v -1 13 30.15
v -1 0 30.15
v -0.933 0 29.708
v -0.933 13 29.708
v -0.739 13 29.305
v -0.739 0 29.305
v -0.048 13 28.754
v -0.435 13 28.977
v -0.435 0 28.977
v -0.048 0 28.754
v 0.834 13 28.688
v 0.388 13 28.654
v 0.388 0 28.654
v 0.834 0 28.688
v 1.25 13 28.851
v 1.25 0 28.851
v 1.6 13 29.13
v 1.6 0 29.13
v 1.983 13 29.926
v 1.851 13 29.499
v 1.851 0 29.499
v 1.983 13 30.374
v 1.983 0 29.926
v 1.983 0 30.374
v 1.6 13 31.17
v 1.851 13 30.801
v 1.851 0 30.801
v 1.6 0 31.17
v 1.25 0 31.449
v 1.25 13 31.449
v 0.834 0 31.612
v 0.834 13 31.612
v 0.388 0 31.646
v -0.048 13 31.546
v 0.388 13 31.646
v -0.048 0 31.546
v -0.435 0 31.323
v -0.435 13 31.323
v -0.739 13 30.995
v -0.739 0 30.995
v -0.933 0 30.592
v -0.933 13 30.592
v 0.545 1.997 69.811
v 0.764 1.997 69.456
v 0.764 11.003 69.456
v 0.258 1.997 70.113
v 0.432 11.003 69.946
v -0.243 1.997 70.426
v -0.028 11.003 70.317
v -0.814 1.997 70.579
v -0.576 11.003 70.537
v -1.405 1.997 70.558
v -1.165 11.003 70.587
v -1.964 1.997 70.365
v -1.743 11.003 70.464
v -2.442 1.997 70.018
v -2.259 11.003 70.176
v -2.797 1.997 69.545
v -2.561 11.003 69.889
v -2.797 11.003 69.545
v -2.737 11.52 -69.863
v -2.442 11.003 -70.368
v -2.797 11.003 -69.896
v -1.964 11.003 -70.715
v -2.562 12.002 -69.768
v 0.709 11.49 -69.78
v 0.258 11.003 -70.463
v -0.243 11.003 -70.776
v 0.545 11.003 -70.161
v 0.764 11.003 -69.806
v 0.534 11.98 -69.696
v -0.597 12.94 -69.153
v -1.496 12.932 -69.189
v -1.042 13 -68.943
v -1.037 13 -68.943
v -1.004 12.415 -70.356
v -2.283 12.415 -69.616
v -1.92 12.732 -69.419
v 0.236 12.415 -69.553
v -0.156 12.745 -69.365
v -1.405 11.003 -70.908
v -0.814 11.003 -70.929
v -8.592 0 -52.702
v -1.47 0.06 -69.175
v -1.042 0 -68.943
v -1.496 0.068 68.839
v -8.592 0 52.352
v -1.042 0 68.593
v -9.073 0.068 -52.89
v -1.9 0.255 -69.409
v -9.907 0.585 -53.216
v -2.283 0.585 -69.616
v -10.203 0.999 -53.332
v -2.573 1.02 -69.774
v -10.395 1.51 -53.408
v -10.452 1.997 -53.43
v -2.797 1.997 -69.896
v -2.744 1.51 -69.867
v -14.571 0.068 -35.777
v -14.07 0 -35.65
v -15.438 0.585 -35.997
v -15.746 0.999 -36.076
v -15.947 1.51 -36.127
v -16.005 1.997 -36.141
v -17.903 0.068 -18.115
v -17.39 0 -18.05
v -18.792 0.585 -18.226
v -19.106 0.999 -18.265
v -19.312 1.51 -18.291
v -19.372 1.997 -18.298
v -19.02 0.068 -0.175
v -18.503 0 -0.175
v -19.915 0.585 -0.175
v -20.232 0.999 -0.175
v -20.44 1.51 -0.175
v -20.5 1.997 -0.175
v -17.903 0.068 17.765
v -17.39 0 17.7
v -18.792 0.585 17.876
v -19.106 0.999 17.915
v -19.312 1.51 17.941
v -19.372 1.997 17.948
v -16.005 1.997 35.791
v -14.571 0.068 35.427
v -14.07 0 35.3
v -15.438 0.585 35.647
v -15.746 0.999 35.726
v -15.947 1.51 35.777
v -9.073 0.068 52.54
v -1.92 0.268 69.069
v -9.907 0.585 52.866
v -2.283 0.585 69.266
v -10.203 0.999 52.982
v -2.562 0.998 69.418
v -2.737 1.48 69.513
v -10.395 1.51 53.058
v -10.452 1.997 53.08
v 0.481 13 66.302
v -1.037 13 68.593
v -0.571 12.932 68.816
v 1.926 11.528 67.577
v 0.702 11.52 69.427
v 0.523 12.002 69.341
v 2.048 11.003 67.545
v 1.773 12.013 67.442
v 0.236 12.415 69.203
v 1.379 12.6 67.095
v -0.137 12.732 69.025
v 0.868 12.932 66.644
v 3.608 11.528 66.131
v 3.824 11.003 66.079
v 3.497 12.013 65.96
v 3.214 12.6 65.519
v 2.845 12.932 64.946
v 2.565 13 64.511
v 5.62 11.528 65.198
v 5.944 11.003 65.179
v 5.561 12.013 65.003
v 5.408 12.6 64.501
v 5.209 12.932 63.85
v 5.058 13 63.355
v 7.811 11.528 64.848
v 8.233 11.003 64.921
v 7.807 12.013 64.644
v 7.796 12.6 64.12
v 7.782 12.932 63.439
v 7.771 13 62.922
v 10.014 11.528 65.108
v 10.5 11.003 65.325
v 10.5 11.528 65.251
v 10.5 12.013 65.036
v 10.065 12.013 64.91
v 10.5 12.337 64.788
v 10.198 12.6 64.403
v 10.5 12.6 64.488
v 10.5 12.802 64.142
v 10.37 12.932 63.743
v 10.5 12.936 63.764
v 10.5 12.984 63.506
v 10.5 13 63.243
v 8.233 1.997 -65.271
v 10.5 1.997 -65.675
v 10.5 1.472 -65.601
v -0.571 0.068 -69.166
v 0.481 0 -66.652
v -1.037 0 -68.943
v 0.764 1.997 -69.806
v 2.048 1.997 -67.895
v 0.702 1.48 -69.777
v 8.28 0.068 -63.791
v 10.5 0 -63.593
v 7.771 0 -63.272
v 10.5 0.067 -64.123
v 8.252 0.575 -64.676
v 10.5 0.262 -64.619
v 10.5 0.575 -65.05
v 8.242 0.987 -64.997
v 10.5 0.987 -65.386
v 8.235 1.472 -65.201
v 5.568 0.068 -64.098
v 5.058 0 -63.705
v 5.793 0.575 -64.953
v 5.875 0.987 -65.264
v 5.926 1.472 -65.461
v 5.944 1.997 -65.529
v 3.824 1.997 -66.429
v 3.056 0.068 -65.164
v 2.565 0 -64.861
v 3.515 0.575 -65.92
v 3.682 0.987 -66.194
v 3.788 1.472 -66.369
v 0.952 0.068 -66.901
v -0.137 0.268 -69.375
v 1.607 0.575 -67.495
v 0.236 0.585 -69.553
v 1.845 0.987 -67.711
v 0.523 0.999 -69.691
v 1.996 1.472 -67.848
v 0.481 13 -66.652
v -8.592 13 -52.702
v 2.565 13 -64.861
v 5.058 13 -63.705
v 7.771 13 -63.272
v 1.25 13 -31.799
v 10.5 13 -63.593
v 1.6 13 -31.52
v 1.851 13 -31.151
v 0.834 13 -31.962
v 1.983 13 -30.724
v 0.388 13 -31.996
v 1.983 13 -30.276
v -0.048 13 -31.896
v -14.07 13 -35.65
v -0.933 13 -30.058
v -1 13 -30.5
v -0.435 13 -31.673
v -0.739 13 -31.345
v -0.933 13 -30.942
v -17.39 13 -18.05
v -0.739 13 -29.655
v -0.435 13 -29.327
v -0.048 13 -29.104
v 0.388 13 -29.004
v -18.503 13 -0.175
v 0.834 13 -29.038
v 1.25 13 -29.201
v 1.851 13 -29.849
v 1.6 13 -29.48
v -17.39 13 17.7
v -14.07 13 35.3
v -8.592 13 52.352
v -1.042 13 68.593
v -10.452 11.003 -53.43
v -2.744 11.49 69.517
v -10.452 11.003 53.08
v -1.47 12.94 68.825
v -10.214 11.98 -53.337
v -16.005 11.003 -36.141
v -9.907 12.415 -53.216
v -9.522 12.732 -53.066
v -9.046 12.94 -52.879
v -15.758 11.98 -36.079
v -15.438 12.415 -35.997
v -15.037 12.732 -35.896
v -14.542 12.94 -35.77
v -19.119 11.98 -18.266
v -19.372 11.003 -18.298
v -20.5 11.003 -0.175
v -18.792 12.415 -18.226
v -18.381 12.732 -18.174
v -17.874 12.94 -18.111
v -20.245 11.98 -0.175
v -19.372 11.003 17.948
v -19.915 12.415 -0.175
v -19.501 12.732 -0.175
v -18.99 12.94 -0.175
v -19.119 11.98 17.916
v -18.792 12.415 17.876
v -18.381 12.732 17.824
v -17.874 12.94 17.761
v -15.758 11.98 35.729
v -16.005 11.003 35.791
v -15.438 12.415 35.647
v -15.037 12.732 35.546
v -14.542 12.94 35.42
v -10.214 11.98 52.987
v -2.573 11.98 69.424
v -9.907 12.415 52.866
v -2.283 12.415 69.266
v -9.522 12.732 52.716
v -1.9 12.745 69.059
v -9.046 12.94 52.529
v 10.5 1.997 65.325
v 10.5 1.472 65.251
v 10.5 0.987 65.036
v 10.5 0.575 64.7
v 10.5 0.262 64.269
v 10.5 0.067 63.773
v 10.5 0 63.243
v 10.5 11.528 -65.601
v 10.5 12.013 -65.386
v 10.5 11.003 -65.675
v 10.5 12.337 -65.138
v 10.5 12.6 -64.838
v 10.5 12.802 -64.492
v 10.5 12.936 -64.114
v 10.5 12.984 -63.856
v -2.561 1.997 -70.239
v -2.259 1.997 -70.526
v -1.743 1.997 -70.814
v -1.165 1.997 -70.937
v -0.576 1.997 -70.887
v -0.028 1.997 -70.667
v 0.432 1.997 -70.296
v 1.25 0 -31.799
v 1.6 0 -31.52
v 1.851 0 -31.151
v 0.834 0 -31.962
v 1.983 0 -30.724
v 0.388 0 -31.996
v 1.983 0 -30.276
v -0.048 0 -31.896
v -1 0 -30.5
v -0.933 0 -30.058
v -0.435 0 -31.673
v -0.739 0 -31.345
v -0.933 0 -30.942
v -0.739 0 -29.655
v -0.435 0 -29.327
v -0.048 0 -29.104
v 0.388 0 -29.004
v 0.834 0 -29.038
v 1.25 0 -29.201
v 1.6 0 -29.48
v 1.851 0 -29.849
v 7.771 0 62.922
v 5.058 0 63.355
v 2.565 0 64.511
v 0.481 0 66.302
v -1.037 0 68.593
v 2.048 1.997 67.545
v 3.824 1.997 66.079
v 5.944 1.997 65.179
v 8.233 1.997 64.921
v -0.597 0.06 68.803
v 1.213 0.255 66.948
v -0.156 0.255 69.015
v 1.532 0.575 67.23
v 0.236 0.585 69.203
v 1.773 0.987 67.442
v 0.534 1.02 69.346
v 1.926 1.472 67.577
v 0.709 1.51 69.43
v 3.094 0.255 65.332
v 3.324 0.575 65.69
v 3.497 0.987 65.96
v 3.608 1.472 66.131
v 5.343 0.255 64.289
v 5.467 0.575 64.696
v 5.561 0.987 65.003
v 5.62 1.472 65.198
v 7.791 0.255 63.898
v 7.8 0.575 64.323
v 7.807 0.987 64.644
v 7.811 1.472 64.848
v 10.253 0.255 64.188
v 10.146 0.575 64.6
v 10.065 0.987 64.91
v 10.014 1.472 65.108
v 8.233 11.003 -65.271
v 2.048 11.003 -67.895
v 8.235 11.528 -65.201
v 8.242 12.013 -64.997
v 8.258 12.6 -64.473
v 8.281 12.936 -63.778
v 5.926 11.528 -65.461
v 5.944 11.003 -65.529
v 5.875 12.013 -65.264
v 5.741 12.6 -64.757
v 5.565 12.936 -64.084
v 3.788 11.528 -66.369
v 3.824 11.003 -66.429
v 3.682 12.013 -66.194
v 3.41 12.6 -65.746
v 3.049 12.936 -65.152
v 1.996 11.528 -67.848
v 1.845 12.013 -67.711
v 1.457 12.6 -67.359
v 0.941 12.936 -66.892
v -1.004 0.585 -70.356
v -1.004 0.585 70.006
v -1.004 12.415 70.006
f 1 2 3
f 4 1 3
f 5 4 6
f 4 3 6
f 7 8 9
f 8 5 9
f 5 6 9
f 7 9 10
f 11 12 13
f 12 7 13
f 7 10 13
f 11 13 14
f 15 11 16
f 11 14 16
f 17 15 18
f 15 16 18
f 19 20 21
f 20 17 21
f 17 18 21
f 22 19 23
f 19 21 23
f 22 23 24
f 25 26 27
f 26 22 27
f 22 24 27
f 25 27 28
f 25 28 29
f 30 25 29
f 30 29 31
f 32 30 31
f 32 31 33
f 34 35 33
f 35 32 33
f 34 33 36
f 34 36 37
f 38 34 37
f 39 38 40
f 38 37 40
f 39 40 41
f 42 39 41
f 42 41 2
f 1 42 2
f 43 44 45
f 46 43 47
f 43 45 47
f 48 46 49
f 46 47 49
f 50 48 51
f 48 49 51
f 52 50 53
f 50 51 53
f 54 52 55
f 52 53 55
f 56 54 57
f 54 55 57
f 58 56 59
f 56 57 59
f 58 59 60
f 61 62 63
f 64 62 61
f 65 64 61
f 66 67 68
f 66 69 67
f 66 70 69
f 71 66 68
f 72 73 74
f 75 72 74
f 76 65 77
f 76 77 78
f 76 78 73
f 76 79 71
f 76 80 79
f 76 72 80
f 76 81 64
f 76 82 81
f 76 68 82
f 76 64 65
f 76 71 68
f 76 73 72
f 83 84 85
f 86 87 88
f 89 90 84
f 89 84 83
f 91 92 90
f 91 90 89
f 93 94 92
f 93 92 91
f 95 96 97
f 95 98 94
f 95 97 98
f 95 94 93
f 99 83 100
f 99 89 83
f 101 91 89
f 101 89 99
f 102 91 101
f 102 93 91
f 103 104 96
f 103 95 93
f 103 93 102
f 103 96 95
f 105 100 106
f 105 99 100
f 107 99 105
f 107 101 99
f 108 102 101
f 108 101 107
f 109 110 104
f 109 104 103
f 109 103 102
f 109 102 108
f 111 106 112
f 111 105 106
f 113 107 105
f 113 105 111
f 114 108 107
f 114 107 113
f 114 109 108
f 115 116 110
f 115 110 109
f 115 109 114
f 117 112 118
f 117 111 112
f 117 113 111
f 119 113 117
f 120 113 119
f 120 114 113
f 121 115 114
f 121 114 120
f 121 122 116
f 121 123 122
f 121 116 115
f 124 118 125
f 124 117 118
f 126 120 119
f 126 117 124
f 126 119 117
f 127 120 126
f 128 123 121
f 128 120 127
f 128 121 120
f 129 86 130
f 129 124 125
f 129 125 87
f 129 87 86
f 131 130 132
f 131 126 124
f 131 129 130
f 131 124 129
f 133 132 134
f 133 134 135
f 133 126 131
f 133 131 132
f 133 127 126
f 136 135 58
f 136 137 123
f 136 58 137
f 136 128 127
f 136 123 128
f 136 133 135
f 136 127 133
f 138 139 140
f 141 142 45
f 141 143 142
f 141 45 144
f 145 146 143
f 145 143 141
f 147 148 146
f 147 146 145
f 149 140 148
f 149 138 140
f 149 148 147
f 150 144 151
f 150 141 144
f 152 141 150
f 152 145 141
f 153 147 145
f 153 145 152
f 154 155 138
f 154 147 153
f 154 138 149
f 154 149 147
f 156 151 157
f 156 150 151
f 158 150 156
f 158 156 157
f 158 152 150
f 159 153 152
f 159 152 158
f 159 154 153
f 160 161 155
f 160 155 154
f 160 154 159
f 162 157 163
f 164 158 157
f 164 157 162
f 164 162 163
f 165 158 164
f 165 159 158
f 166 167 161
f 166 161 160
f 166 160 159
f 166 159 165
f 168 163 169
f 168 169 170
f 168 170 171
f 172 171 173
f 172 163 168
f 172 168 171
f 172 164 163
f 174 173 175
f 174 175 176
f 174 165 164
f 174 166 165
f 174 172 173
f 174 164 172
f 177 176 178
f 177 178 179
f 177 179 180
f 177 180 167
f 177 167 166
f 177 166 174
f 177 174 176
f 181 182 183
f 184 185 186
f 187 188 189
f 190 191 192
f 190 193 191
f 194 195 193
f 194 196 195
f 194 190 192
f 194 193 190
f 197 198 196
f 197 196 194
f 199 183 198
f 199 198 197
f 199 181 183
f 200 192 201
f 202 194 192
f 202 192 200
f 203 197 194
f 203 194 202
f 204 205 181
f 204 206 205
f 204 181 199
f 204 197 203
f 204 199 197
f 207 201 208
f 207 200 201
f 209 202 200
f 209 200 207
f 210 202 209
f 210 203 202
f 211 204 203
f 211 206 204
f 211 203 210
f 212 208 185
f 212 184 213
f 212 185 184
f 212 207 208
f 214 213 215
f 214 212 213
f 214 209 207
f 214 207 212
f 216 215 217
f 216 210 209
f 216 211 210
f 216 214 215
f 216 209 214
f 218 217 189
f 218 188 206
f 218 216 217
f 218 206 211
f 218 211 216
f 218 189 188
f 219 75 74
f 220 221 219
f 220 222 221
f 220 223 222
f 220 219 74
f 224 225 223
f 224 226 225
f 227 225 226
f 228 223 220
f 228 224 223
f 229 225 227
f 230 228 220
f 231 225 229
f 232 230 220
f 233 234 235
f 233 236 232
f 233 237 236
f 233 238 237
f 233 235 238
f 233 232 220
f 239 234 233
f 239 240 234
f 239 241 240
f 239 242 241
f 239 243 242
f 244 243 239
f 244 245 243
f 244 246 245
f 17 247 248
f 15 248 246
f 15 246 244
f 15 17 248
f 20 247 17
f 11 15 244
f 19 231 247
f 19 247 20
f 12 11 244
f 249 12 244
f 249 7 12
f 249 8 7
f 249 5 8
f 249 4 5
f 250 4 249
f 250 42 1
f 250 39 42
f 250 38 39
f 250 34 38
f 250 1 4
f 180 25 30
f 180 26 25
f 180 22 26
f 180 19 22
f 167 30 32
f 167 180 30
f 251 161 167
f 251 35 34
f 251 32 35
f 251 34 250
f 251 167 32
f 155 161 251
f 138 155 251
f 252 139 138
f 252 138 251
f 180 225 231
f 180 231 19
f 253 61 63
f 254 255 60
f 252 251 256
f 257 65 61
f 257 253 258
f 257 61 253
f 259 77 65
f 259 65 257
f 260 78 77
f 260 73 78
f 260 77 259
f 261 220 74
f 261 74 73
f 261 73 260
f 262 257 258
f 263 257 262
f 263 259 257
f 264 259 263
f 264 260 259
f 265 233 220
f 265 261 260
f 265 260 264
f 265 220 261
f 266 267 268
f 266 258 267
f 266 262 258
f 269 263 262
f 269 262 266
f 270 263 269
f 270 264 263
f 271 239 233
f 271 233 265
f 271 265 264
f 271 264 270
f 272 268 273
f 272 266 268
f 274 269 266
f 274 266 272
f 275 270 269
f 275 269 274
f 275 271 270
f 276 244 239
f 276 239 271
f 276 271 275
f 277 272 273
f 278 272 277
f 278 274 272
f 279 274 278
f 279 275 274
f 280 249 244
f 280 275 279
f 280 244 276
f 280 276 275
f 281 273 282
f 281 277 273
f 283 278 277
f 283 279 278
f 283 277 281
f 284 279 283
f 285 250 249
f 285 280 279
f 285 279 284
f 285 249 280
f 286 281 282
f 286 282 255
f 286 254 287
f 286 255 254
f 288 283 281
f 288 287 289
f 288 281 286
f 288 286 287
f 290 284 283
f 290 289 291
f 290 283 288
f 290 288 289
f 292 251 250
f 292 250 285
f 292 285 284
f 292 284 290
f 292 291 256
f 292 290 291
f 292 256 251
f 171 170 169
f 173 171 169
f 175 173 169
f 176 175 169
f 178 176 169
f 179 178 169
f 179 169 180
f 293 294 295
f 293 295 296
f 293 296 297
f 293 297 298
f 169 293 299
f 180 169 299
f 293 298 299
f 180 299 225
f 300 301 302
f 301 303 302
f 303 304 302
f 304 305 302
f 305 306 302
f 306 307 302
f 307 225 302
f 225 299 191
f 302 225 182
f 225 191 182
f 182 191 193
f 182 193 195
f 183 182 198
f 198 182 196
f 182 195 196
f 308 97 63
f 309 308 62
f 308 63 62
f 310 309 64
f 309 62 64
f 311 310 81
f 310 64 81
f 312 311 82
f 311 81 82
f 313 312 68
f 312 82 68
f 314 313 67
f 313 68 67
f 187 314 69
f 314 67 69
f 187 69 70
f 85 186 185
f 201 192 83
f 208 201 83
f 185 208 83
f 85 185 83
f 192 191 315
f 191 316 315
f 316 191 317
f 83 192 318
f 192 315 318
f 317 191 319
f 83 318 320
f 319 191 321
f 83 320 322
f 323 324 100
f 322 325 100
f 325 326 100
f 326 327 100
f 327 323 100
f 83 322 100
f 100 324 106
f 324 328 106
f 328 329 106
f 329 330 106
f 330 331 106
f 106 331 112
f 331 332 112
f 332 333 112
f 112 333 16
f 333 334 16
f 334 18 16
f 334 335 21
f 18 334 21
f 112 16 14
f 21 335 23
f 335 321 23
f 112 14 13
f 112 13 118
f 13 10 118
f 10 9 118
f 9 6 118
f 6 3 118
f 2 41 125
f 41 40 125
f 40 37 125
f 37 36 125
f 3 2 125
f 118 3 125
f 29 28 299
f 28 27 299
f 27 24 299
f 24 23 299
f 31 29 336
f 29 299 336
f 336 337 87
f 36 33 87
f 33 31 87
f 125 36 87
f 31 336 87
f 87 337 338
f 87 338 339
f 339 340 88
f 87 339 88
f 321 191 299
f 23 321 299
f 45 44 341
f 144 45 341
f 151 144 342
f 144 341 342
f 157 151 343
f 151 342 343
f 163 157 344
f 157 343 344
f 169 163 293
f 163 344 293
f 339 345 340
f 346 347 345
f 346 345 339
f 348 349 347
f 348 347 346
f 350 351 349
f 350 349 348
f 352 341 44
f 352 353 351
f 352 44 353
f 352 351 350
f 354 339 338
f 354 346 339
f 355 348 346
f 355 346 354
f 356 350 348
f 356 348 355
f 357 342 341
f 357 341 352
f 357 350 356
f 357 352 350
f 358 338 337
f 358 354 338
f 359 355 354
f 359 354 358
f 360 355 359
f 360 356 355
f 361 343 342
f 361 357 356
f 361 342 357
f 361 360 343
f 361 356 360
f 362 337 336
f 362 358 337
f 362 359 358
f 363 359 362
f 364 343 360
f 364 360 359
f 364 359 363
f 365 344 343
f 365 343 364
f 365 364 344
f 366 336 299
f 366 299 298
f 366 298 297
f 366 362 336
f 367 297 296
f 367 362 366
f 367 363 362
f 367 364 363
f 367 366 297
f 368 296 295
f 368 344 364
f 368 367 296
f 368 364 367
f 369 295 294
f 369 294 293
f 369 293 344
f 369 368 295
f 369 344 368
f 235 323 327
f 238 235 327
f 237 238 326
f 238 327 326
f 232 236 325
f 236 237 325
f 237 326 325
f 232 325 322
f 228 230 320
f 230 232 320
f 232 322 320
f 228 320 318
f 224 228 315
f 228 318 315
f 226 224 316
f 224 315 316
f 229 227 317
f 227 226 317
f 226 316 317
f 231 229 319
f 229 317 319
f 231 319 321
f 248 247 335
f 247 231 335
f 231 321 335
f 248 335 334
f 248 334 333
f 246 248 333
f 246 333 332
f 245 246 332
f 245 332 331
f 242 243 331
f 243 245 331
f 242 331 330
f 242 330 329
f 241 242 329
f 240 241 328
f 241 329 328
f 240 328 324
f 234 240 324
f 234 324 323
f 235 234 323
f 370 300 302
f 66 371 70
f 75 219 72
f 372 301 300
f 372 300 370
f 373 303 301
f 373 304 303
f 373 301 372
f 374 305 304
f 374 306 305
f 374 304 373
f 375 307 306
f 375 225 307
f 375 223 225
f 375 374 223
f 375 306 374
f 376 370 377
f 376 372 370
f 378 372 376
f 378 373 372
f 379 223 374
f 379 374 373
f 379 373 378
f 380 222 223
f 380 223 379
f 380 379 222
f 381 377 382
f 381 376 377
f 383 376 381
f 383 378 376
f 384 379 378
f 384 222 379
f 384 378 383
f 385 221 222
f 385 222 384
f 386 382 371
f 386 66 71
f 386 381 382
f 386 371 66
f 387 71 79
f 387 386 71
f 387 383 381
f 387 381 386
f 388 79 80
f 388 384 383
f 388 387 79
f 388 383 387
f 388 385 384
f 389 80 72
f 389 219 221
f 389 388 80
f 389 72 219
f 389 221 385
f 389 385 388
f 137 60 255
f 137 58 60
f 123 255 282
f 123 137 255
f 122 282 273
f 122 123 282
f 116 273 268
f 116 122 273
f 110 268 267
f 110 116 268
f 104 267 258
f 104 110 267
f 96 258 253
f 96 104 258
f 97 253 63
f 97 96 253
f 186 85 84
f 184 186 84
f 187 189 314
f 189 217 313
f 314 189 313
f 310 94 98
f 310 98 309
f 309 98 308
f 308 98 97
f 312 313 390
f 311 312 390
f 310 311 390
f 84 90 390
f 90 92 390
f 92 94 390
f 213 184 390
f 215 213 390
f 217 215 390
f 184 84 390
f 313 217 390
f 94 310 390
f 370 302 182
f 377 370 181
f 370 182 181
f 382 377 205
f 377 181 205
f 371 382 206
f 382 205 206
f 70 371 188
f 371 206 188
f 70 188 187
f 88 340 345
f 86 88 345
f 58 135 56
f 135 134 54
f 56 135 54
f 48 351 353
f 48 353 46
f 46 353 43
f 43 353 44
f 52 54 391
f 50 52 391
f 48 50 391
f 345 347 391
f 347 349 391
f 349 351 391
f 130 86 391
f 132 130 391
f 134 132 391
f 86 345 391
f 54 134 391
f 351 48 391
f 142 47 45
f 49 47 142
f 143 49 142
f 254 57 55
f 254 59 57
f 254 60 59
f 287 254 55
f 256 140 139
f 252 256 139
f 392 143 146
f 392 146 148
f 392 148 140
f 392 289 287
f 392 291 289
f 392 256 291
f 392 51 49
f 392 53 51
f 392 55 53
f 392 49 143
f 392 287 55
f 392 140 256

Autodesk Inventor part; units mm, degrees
ref_plane "YZ Plane" through (0, 0, 0) normal (1, 0, 0) x (0, 1, 0)
ref_plane "XZ Plane" through (0, 0, 0) normal (0, 1, 0) x (-1, 0, 0)
ref_plane "XY Plane" through (0, 0, 0) normal (0, 0, 1) x (1, 0, 0)
sketch "Sketch1" plane through (0, 0, 0) normal (0, 1, 0) x (-1, 0, 0)
  line L0 (-10.5, 65.5) -> (-10.5, -65.5)
  line L1 (-10.5, 65.5) -> (-10.5, -65.5)
  line L2 (-10.5, -65.5) -> (-10.5, 65.5)
  line L3 (-10.5, -65.5) -> (-10.5, -30.5)
  line L4 (-10.5, 65.5) -> (-10.5, 30.15)
  line L5 (-10.5, 30.5) -> (-10.5, -30.5)
  line L6 (-10.5, 30.5) -> (-10.5, -30.5)
  circle A0 centre (-0.5, -30.5) radius 1.5
  line L7 (-10.5, -30.5) -> (-10.5, 30.15)
  circle A1 centre (-0.5, 30.15) radius 1.5
  line L8 (-10.5, -0.175) -> (20.5, -0.175)
  line L9 (-10.5, -0.175) -> (-10.5, -65.675)
  line L10 (-10.5, -0.175) -> (-10.5, 65.325)
  arc A2 (-10.5, 65.325) -> (-0.2045, 74.8119) centre (-7.9767, 72.9166) ccw
  arc A3 (-0.2045, -75.1619) -> (-10.5, -65.675) centre (-7.9767, -73.2666) ccw
  arc A4 (-0.2045, -75.1619) -> (-0.2045, 74.8119) centre (-125.6452, -0.175) ccw
  line L11 (-10.5, -65.675) -> (-10.5, 65.325)
  point P0 (0, 0)
  dimension "d13" = 35
  dimension "d14" = 35.35
  dimension "d17" = 3
  dimension "d21" = 3
  dimension "d24" = 31
  dimension "d27" = 65.5
  dimension "d28" = 65.5
  dimension "d35" = 14
  dimension "d36" = 8
  dimension "d37" = 14
  dimension "d38" = 8
extrude "Extrusion5" add sketch "Sketch1" along normal blind 13
fillet "Fillet1" radius 2 2 edges at (0.2045, 6.5, 74.8119) (0.2045, 6.5, -75.1619)
fillet "Fillet2" radius 2 12 edges at (-16.0052, 0, -36.1415) (-16.0052, 0, 35.7915) (-0.9895, 0, 70.5908) (4.8517, 0, 65.5522) (-0.9895, 0, -70.9408) (4.8517, 0, -65.9022) (-0.9895, 13, 70.5908) (4.8517, 13, 65.5522) (-0.9895, 13, -70.9408) (4.8517, 13, -65.9022) (-16.0052, 13, -36.1415) (-16.0052, 13, 35.7915)
properties part number "naraznik_kryt"
